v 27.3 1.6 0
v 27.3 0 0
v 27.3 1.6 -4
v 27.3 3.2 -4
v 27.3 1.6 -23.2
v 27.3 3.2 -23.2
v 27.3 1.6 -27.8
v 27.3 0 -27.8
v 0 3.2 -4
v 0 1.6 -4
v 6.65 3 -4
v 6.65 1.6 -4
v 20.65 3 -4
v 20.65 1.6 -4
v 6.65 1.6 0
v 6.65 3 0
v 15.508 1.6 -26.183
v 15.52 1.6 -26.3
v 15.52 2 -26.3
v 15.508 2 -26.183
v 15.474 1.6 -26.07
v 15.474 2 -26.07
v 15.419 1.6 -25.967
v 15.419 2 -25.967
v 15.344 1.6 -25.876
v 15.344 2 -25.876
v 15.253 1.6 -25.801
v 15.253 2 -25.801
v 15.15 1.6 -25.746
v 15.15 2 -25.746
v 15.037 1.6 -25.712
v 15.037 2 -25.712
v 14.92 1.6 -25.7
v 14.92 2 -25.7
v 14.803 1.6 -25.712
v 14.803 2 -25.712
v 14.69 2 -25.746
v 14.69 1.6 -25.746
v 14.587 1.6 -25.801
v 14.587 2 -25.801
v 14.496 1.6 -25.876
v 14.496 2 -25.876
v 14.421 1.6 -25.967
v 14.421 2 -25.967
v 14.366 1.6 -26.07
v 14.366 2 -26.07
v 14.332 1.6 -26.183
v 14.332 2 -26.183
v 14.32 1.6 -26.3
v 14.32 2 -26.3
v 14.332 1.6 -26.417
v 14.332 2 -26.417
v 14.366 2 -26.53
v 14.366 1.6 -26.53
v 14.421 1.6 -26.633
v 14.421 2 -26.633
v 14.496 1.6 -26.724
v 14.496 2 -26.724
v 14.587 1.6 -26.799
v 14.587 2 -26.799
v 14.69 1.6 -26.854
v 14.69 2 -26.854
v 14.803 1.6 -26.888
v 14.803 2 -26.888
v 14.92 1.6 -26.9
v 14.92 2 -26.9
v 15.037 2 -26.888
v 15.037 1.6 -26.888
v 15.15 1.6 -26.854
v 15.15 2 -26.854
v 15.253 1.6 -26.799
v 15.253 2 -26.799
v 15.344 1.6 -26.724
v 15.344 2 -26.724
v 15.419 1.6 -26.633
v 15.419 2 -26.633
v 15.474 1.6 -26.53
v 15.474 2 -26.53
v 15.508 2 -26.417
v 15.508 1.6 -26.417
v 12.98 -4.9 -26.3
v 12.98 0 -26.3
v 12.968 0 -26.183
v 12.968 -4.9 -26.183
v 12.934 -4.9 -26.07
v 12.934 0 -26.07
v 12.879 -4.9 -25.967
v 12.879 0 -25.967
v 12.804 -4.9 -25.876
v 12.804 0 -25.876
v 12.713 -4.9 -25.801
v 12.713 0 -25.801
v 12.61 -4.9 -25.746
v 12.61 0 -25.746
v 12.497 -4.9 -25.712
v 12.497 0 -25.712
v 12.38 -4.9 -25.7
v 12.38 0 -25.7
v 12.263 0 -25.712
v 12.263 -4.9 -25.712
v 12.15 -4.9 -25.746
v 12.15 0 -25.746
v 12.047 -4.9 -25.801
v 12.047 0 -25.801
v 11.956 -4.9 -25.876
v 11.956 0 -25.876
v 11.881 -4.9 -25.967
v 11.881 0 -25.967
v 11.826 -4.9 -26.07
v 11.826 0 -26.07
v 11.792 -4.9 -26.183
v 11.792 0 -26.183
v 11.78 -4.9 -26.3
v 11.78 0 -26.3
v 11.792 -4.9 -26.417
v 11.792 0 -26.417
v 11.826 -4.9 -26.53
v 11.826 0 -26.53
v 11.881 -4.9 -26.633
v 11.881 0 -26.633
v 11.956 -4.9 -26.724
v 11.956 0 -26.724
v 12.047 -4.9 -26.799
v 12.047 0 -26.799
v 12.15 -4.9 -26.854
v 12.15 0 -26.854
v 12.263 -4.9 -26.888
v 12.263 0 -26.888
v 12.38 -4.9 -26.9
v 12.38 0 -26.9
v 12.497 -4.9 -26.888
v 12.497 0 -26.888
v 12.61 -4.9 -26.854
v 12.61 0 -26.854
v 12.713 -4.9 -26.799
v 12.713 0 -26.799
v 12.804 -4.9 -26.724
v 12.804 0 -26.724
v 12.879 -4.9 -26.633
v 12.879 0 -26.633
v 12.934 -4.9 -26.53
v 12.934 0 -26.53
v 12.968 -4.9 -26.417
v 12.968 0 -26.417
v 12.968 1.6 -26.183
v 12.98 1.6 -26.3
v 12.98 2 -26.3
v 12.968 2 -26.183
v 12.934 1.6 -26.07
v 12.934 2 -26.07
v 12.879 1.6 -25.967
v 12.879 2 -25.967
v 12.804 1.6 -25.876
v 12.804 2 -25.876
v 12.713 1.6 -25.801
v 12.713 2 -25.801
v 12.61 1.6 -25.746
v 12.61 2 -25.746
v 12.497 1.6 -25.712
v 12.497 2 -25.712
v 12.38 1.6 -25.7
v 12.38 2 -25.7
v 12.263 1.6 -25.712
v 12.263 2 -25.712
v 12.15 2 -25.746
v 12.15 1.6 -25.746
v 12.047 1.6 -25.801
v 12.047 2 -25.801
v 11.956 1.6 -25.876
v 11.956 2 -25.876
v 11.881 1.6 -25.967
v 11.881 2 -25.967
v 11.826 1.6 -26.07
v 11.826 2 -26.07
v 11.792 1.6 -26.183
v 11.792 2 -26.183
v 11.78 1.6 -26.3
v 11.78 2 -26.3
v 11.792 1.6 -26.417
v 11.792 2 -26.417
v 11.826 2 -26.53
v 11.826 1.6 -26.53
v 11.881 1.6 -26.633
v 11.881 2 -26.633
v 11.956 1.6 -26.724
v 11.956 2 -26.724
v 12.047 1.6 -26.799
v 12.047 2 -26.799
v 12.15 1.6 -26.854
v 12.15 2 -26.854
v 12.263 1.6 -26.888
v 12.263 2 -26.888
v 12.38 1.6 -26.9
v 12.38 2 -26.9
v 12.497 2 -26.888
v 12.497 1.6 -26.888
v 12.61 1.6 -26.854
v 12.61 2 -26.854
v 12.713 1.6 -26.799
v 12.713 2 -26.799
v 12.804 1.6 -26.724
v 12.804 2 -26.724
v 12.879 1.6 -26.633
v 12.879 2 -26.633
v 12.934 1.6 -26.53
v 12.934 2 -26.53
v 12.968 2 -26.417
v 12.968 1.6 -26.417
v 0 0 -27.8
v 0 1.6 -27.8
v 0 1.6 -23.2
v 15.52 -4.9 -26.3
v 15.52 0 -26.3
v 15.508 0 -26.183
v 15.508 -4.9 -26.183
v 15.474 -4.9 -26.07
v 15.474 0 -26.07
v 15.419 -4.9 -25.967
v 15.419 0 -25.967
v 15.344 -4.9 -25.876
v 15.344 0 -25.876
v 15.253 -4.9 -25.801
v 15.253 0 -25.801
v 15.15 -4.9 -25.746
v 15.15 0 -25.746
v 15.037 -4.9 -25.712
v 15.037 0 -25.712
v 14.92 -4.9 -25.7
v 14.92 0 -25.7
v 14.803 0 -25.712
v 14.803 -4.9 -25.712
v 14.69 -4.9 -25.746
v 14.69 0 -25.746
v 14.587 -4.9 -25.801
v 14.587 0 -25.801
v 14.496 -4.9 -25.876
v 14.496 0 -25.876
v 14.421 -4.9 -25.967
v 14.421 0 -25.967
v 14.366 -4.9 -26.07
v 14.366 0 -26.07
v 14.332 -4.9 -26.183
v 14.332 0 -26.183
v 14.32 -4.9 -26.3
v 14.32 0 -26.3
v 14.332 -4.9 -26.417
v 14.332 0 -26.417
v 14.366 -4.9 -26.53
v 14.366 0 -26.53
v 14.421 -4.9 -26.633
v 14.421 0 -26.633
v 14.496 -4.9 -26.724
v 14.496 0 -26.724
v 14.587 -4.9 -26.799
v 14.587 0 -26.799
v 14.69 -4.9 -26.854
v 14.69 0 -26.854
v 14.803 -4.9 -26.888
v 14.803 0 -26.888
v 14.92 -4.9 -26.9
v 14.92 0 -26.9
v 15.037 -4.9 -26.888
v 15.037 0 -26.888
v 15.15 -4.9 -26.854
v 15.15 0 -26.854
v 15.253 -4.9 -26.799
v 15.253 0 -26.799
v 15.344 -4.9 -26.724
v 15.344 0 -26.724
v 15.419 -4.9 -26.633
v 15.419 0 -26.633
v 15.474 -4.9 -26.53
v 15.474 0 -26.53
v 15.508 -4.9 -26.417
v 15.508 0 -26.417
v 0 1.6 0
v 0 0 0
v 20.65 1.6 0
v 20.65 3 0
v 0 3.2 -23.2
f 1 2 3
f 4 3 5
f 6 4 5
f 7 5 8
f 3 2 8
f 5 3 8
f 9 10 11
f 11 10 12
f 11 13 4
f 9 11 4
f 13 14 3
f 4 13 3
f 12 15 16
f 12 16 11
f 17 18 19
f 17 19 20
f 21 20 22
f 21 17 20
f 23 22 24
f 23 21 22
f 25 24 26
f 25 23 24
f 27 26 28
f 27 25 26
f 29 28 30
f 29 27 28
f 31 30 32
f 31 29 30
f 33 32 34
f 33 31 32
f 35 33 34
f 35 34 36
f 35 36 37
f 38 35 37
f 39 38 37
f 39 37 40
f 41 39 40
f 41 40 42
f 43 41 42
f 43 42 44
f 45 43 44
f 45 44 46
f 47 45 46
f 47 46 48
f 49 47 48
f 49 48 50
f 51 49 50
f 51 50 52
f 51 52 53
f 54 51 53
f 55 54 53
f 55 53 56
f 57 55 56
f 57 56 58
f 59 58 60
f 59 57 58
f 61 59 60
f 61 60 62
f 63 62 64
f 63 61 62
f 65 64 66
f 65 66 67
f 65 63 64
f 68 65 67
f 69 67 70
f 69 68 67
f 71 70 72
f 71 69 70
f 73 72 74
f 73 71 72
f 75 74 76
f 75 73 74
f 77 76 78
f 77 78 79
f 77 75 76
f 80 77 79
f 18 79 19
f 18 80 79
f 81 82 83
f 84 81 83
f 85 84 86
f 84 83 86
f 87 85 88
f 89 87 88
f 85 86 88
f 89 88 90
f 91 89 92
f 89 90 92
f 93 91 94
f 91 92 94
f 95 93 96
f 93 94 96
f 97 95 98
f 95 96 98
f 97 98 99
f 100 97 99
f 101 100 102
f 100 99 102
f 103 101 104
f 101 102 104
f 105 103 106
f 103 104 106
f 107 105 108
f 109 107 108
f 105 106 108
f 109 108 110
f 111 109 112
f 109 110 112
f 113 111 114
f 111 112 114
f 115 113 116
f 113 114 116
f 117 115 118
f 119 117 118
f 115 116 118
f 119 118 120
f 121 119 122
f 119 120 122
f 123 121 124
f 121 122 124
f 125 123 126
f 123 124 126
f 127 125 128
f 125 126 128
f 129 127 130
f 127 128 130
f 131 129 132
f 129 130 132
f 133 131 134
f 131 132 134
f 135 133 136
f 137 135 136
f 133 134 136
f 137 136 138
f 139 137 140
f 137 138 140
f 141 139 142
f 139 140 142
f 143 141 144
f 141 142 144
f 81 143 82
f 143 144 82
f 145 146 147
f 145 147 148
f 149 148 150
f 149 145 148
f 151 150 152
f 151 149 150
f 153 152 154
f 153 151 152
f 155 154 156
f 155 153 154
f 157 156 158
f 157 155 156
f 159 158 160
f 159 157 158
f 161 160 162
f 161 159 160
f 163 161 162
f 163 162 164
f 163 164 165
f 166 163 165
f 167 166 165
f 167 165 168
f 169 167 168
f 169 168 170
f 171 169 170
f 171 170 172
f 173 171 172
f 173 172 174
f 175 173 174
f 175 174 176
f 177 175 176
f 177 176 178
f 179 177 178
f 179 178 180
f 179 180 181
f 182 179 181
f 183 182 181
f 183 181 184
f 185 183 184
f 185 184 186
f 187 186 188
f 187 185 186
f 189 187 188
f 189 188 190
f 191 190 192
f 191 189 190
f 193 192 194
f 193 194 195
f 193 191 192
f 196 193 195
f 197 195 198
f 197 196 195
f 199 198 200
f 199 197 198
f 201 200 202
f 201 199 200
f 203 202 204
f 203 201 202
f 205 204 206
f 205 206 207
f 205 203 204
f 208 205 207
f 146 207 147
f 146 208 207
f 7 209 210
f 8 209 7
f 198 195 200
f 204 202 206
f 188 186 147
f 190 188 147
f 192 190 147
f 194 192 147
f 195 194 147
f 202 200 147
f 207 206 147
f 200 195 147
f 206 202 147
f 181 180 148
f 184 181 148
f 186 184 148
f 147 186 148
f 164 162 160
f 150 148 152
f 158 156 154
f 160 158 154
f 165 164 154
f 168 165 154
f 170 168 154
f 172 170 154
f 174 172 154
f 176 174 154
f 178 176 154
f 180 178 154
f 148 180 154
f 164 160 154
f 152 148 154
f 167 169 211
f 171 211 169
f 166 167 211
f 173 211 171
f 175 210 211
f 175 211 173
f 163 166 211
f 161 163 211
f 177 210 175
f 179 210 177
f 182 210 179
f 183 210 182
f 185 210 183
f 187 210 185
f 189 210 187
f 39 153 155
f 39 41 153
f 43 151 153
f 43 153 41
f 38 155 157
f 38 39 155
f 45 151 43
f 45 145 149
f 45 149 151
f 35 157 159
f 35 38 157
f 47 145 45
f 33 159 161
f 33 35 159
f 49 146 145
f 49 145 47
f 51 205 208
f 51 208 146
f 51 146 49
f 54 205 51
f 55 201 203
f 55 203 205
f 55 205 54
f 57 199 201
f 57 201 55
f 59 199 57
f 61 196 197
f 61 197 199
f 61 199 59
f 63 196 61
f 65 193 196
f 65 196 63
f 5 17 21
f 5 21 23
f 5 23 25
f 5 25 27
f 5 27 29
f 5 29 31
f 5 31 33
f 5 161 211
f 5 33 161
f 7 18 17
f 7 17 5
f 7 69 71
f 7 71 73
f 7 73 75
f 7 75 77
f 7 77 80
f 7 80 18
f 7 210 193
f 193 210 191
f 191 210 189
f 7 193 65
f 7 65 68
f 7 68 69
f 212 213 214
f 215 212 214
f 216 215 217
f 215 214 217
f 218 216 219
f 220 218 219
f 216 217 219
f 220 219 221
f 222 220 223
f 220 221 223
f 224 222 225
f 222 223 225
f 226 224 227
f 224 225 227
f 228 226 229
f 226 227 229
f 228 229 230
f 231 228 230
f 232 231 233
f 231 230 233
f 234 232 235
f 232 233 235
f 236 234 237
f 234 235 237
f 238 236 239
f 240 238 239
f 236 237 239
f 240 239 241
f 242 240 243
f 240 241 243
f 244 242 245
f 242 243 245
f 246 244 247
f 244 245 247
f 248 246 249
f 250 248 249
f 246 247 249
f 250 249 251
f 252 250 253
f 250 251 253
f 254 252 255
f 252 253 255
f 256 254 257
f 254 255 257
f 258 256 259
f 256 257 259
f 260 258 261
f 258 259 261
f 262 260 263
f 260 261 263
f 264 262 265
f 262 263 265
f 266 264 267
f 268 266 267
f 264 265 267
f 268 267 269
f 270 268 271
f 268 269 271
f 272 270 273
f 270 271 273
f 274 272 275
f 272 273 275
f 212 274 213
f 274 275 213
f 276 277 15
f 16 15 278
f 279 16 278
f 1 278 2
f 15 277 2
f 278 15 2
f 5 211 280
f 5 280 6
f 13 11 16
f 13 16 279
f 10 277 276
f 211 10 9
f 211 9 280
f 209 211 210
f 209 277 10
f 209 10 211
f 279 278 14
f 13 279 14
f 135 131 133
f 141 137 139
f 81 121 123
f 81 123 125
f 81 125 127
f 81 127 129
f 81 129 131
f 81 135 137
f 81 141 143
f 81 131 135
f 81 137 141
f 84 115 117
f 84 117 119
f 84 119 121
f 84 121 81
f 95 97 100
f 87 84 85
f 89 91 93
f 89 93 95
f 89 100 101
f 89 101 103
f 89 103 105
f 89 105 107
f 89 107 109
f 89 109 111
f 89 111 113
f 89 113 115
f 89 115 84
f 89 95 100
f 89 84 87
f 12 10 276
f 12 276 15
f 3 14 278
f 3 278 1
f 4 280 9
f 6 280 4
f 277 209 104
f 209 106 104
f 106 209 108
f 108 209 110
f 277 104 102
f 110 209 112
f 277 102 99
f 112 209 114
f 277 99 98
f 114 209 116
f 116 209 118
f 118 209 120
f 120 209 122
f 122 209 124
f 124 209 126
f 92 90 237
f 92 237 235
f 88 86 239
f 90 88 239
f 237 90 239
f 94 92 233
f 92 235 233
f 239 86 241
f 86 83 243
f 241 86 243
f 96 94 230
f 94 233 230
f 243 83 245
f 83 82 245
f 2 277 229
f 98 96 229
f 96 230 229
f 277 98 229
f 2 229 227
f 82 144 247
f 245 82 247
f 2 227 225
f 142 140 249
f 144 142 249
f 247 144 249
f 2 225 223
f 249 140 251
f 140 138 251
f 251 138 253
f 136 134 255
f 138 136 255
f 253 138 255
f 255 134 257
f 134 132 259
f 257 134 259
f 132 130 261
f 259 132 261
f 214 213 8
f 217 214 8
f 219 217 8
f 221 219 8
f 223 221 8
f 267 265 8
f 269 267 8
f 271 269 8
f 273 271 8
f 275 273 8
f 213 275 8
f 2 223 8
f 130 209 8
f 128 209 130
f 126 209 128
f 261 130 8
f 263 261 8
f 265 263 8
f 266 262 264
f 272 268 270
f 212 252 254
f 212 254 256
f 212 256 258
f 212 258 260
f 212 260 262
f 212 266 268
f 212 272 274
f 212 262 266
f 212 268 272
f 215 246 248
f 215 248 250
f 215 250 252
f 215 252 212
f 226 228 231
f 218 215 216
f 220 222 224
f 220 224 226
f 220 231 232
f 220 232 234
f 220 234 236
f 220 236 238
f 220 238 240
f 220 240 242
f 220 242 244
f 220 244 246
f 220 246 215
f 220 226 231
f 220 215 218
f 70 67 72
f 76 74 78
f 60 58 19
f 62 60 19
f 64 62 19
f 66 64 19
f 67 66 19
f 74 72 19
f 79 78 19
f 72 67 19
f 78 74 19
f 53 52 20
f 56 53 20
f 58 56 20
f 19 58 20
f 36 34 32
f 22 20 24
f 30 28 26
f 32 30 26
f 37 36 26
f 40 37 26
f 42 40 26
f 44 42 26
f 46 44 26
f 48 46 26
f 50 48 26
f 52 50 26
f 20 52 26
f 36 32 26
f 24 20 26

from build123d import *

# Parameters (mm, degrees)
SKETCH_1_W           = 27.3
SKETCH_1_H           = 27.8
EXTRUDE_1_DEPTH      = 1.6
SKETCH_2_R           = 0.6
EXTRUDE_2_DEPTH      = 4.9
EXTRUDE_2_DEPTH_BACK = 2
SKETCH_3_W           = 27.3
SKETCH_3_H           = 19.2
EXTRUDE_3_DEPTH      = 1.6
SKETCH_4_W           = 14
SKETCH_4_H           = 4
EXTRUDE_4_DEPTH      = 1.4


with BuildPart() as part:
    # 草图1 → 凸台-拉伸1 (new body)
    with BuildSketch(Plane(origin=(0, 0, 0), x_dir=(1, 0, 0), z_dir=(0, 1, 0))):
        with Locations((13.65, 13.9)):
            Rectangle(SKETCH_1_W, SKETCH_1_H)
    extrude(amount=EXTRUDE_1_DEPTH)

    # 草图2 → 凸台-拉伸2 (add, two sides)
    with BuildSketch(Plane.XZ) as extrude_2_sk:
        with Locations((14.92, -26.3)):
            Circle(SKETCH_2_R)
        with Locations((12.38, -26.3)):
            Circle(SKETCH_2_R)
    extrude(amount=EXTRUDE_2_DEPTH)
    extrude(extrude_2_sk.sketch, amount=-EXTRUDE_2_DEPTH_BACK)

    # 草图3 → 凸台-拉伸3 (add)
    with BuildSketch(Plane(origin=(0, 1.6, 0), x_dir=(1, 0, 0), z_dir=(0, 1, 0))):
        with Locations((13.65, 13.6)):
            Rectangle(SKETCH_3_W, SKETCH_3_H)
    extrude(amount=EXTRUDE_3_DEPTH)

    # 草图4 → 凸台-拉伸4 (add)
    with BuildSketch(Plane(origin=(0, 1.6, 0), x_dir=(1, 0, 0), z_dir=(0, 1, 0))):
        with Locations((13.65, 2)):
            Rectangle(SKETCH_4_W, SKETCH_4_H)
    extrude(amount=EXTRUDE_4_DEPTH)


solid = part.part
